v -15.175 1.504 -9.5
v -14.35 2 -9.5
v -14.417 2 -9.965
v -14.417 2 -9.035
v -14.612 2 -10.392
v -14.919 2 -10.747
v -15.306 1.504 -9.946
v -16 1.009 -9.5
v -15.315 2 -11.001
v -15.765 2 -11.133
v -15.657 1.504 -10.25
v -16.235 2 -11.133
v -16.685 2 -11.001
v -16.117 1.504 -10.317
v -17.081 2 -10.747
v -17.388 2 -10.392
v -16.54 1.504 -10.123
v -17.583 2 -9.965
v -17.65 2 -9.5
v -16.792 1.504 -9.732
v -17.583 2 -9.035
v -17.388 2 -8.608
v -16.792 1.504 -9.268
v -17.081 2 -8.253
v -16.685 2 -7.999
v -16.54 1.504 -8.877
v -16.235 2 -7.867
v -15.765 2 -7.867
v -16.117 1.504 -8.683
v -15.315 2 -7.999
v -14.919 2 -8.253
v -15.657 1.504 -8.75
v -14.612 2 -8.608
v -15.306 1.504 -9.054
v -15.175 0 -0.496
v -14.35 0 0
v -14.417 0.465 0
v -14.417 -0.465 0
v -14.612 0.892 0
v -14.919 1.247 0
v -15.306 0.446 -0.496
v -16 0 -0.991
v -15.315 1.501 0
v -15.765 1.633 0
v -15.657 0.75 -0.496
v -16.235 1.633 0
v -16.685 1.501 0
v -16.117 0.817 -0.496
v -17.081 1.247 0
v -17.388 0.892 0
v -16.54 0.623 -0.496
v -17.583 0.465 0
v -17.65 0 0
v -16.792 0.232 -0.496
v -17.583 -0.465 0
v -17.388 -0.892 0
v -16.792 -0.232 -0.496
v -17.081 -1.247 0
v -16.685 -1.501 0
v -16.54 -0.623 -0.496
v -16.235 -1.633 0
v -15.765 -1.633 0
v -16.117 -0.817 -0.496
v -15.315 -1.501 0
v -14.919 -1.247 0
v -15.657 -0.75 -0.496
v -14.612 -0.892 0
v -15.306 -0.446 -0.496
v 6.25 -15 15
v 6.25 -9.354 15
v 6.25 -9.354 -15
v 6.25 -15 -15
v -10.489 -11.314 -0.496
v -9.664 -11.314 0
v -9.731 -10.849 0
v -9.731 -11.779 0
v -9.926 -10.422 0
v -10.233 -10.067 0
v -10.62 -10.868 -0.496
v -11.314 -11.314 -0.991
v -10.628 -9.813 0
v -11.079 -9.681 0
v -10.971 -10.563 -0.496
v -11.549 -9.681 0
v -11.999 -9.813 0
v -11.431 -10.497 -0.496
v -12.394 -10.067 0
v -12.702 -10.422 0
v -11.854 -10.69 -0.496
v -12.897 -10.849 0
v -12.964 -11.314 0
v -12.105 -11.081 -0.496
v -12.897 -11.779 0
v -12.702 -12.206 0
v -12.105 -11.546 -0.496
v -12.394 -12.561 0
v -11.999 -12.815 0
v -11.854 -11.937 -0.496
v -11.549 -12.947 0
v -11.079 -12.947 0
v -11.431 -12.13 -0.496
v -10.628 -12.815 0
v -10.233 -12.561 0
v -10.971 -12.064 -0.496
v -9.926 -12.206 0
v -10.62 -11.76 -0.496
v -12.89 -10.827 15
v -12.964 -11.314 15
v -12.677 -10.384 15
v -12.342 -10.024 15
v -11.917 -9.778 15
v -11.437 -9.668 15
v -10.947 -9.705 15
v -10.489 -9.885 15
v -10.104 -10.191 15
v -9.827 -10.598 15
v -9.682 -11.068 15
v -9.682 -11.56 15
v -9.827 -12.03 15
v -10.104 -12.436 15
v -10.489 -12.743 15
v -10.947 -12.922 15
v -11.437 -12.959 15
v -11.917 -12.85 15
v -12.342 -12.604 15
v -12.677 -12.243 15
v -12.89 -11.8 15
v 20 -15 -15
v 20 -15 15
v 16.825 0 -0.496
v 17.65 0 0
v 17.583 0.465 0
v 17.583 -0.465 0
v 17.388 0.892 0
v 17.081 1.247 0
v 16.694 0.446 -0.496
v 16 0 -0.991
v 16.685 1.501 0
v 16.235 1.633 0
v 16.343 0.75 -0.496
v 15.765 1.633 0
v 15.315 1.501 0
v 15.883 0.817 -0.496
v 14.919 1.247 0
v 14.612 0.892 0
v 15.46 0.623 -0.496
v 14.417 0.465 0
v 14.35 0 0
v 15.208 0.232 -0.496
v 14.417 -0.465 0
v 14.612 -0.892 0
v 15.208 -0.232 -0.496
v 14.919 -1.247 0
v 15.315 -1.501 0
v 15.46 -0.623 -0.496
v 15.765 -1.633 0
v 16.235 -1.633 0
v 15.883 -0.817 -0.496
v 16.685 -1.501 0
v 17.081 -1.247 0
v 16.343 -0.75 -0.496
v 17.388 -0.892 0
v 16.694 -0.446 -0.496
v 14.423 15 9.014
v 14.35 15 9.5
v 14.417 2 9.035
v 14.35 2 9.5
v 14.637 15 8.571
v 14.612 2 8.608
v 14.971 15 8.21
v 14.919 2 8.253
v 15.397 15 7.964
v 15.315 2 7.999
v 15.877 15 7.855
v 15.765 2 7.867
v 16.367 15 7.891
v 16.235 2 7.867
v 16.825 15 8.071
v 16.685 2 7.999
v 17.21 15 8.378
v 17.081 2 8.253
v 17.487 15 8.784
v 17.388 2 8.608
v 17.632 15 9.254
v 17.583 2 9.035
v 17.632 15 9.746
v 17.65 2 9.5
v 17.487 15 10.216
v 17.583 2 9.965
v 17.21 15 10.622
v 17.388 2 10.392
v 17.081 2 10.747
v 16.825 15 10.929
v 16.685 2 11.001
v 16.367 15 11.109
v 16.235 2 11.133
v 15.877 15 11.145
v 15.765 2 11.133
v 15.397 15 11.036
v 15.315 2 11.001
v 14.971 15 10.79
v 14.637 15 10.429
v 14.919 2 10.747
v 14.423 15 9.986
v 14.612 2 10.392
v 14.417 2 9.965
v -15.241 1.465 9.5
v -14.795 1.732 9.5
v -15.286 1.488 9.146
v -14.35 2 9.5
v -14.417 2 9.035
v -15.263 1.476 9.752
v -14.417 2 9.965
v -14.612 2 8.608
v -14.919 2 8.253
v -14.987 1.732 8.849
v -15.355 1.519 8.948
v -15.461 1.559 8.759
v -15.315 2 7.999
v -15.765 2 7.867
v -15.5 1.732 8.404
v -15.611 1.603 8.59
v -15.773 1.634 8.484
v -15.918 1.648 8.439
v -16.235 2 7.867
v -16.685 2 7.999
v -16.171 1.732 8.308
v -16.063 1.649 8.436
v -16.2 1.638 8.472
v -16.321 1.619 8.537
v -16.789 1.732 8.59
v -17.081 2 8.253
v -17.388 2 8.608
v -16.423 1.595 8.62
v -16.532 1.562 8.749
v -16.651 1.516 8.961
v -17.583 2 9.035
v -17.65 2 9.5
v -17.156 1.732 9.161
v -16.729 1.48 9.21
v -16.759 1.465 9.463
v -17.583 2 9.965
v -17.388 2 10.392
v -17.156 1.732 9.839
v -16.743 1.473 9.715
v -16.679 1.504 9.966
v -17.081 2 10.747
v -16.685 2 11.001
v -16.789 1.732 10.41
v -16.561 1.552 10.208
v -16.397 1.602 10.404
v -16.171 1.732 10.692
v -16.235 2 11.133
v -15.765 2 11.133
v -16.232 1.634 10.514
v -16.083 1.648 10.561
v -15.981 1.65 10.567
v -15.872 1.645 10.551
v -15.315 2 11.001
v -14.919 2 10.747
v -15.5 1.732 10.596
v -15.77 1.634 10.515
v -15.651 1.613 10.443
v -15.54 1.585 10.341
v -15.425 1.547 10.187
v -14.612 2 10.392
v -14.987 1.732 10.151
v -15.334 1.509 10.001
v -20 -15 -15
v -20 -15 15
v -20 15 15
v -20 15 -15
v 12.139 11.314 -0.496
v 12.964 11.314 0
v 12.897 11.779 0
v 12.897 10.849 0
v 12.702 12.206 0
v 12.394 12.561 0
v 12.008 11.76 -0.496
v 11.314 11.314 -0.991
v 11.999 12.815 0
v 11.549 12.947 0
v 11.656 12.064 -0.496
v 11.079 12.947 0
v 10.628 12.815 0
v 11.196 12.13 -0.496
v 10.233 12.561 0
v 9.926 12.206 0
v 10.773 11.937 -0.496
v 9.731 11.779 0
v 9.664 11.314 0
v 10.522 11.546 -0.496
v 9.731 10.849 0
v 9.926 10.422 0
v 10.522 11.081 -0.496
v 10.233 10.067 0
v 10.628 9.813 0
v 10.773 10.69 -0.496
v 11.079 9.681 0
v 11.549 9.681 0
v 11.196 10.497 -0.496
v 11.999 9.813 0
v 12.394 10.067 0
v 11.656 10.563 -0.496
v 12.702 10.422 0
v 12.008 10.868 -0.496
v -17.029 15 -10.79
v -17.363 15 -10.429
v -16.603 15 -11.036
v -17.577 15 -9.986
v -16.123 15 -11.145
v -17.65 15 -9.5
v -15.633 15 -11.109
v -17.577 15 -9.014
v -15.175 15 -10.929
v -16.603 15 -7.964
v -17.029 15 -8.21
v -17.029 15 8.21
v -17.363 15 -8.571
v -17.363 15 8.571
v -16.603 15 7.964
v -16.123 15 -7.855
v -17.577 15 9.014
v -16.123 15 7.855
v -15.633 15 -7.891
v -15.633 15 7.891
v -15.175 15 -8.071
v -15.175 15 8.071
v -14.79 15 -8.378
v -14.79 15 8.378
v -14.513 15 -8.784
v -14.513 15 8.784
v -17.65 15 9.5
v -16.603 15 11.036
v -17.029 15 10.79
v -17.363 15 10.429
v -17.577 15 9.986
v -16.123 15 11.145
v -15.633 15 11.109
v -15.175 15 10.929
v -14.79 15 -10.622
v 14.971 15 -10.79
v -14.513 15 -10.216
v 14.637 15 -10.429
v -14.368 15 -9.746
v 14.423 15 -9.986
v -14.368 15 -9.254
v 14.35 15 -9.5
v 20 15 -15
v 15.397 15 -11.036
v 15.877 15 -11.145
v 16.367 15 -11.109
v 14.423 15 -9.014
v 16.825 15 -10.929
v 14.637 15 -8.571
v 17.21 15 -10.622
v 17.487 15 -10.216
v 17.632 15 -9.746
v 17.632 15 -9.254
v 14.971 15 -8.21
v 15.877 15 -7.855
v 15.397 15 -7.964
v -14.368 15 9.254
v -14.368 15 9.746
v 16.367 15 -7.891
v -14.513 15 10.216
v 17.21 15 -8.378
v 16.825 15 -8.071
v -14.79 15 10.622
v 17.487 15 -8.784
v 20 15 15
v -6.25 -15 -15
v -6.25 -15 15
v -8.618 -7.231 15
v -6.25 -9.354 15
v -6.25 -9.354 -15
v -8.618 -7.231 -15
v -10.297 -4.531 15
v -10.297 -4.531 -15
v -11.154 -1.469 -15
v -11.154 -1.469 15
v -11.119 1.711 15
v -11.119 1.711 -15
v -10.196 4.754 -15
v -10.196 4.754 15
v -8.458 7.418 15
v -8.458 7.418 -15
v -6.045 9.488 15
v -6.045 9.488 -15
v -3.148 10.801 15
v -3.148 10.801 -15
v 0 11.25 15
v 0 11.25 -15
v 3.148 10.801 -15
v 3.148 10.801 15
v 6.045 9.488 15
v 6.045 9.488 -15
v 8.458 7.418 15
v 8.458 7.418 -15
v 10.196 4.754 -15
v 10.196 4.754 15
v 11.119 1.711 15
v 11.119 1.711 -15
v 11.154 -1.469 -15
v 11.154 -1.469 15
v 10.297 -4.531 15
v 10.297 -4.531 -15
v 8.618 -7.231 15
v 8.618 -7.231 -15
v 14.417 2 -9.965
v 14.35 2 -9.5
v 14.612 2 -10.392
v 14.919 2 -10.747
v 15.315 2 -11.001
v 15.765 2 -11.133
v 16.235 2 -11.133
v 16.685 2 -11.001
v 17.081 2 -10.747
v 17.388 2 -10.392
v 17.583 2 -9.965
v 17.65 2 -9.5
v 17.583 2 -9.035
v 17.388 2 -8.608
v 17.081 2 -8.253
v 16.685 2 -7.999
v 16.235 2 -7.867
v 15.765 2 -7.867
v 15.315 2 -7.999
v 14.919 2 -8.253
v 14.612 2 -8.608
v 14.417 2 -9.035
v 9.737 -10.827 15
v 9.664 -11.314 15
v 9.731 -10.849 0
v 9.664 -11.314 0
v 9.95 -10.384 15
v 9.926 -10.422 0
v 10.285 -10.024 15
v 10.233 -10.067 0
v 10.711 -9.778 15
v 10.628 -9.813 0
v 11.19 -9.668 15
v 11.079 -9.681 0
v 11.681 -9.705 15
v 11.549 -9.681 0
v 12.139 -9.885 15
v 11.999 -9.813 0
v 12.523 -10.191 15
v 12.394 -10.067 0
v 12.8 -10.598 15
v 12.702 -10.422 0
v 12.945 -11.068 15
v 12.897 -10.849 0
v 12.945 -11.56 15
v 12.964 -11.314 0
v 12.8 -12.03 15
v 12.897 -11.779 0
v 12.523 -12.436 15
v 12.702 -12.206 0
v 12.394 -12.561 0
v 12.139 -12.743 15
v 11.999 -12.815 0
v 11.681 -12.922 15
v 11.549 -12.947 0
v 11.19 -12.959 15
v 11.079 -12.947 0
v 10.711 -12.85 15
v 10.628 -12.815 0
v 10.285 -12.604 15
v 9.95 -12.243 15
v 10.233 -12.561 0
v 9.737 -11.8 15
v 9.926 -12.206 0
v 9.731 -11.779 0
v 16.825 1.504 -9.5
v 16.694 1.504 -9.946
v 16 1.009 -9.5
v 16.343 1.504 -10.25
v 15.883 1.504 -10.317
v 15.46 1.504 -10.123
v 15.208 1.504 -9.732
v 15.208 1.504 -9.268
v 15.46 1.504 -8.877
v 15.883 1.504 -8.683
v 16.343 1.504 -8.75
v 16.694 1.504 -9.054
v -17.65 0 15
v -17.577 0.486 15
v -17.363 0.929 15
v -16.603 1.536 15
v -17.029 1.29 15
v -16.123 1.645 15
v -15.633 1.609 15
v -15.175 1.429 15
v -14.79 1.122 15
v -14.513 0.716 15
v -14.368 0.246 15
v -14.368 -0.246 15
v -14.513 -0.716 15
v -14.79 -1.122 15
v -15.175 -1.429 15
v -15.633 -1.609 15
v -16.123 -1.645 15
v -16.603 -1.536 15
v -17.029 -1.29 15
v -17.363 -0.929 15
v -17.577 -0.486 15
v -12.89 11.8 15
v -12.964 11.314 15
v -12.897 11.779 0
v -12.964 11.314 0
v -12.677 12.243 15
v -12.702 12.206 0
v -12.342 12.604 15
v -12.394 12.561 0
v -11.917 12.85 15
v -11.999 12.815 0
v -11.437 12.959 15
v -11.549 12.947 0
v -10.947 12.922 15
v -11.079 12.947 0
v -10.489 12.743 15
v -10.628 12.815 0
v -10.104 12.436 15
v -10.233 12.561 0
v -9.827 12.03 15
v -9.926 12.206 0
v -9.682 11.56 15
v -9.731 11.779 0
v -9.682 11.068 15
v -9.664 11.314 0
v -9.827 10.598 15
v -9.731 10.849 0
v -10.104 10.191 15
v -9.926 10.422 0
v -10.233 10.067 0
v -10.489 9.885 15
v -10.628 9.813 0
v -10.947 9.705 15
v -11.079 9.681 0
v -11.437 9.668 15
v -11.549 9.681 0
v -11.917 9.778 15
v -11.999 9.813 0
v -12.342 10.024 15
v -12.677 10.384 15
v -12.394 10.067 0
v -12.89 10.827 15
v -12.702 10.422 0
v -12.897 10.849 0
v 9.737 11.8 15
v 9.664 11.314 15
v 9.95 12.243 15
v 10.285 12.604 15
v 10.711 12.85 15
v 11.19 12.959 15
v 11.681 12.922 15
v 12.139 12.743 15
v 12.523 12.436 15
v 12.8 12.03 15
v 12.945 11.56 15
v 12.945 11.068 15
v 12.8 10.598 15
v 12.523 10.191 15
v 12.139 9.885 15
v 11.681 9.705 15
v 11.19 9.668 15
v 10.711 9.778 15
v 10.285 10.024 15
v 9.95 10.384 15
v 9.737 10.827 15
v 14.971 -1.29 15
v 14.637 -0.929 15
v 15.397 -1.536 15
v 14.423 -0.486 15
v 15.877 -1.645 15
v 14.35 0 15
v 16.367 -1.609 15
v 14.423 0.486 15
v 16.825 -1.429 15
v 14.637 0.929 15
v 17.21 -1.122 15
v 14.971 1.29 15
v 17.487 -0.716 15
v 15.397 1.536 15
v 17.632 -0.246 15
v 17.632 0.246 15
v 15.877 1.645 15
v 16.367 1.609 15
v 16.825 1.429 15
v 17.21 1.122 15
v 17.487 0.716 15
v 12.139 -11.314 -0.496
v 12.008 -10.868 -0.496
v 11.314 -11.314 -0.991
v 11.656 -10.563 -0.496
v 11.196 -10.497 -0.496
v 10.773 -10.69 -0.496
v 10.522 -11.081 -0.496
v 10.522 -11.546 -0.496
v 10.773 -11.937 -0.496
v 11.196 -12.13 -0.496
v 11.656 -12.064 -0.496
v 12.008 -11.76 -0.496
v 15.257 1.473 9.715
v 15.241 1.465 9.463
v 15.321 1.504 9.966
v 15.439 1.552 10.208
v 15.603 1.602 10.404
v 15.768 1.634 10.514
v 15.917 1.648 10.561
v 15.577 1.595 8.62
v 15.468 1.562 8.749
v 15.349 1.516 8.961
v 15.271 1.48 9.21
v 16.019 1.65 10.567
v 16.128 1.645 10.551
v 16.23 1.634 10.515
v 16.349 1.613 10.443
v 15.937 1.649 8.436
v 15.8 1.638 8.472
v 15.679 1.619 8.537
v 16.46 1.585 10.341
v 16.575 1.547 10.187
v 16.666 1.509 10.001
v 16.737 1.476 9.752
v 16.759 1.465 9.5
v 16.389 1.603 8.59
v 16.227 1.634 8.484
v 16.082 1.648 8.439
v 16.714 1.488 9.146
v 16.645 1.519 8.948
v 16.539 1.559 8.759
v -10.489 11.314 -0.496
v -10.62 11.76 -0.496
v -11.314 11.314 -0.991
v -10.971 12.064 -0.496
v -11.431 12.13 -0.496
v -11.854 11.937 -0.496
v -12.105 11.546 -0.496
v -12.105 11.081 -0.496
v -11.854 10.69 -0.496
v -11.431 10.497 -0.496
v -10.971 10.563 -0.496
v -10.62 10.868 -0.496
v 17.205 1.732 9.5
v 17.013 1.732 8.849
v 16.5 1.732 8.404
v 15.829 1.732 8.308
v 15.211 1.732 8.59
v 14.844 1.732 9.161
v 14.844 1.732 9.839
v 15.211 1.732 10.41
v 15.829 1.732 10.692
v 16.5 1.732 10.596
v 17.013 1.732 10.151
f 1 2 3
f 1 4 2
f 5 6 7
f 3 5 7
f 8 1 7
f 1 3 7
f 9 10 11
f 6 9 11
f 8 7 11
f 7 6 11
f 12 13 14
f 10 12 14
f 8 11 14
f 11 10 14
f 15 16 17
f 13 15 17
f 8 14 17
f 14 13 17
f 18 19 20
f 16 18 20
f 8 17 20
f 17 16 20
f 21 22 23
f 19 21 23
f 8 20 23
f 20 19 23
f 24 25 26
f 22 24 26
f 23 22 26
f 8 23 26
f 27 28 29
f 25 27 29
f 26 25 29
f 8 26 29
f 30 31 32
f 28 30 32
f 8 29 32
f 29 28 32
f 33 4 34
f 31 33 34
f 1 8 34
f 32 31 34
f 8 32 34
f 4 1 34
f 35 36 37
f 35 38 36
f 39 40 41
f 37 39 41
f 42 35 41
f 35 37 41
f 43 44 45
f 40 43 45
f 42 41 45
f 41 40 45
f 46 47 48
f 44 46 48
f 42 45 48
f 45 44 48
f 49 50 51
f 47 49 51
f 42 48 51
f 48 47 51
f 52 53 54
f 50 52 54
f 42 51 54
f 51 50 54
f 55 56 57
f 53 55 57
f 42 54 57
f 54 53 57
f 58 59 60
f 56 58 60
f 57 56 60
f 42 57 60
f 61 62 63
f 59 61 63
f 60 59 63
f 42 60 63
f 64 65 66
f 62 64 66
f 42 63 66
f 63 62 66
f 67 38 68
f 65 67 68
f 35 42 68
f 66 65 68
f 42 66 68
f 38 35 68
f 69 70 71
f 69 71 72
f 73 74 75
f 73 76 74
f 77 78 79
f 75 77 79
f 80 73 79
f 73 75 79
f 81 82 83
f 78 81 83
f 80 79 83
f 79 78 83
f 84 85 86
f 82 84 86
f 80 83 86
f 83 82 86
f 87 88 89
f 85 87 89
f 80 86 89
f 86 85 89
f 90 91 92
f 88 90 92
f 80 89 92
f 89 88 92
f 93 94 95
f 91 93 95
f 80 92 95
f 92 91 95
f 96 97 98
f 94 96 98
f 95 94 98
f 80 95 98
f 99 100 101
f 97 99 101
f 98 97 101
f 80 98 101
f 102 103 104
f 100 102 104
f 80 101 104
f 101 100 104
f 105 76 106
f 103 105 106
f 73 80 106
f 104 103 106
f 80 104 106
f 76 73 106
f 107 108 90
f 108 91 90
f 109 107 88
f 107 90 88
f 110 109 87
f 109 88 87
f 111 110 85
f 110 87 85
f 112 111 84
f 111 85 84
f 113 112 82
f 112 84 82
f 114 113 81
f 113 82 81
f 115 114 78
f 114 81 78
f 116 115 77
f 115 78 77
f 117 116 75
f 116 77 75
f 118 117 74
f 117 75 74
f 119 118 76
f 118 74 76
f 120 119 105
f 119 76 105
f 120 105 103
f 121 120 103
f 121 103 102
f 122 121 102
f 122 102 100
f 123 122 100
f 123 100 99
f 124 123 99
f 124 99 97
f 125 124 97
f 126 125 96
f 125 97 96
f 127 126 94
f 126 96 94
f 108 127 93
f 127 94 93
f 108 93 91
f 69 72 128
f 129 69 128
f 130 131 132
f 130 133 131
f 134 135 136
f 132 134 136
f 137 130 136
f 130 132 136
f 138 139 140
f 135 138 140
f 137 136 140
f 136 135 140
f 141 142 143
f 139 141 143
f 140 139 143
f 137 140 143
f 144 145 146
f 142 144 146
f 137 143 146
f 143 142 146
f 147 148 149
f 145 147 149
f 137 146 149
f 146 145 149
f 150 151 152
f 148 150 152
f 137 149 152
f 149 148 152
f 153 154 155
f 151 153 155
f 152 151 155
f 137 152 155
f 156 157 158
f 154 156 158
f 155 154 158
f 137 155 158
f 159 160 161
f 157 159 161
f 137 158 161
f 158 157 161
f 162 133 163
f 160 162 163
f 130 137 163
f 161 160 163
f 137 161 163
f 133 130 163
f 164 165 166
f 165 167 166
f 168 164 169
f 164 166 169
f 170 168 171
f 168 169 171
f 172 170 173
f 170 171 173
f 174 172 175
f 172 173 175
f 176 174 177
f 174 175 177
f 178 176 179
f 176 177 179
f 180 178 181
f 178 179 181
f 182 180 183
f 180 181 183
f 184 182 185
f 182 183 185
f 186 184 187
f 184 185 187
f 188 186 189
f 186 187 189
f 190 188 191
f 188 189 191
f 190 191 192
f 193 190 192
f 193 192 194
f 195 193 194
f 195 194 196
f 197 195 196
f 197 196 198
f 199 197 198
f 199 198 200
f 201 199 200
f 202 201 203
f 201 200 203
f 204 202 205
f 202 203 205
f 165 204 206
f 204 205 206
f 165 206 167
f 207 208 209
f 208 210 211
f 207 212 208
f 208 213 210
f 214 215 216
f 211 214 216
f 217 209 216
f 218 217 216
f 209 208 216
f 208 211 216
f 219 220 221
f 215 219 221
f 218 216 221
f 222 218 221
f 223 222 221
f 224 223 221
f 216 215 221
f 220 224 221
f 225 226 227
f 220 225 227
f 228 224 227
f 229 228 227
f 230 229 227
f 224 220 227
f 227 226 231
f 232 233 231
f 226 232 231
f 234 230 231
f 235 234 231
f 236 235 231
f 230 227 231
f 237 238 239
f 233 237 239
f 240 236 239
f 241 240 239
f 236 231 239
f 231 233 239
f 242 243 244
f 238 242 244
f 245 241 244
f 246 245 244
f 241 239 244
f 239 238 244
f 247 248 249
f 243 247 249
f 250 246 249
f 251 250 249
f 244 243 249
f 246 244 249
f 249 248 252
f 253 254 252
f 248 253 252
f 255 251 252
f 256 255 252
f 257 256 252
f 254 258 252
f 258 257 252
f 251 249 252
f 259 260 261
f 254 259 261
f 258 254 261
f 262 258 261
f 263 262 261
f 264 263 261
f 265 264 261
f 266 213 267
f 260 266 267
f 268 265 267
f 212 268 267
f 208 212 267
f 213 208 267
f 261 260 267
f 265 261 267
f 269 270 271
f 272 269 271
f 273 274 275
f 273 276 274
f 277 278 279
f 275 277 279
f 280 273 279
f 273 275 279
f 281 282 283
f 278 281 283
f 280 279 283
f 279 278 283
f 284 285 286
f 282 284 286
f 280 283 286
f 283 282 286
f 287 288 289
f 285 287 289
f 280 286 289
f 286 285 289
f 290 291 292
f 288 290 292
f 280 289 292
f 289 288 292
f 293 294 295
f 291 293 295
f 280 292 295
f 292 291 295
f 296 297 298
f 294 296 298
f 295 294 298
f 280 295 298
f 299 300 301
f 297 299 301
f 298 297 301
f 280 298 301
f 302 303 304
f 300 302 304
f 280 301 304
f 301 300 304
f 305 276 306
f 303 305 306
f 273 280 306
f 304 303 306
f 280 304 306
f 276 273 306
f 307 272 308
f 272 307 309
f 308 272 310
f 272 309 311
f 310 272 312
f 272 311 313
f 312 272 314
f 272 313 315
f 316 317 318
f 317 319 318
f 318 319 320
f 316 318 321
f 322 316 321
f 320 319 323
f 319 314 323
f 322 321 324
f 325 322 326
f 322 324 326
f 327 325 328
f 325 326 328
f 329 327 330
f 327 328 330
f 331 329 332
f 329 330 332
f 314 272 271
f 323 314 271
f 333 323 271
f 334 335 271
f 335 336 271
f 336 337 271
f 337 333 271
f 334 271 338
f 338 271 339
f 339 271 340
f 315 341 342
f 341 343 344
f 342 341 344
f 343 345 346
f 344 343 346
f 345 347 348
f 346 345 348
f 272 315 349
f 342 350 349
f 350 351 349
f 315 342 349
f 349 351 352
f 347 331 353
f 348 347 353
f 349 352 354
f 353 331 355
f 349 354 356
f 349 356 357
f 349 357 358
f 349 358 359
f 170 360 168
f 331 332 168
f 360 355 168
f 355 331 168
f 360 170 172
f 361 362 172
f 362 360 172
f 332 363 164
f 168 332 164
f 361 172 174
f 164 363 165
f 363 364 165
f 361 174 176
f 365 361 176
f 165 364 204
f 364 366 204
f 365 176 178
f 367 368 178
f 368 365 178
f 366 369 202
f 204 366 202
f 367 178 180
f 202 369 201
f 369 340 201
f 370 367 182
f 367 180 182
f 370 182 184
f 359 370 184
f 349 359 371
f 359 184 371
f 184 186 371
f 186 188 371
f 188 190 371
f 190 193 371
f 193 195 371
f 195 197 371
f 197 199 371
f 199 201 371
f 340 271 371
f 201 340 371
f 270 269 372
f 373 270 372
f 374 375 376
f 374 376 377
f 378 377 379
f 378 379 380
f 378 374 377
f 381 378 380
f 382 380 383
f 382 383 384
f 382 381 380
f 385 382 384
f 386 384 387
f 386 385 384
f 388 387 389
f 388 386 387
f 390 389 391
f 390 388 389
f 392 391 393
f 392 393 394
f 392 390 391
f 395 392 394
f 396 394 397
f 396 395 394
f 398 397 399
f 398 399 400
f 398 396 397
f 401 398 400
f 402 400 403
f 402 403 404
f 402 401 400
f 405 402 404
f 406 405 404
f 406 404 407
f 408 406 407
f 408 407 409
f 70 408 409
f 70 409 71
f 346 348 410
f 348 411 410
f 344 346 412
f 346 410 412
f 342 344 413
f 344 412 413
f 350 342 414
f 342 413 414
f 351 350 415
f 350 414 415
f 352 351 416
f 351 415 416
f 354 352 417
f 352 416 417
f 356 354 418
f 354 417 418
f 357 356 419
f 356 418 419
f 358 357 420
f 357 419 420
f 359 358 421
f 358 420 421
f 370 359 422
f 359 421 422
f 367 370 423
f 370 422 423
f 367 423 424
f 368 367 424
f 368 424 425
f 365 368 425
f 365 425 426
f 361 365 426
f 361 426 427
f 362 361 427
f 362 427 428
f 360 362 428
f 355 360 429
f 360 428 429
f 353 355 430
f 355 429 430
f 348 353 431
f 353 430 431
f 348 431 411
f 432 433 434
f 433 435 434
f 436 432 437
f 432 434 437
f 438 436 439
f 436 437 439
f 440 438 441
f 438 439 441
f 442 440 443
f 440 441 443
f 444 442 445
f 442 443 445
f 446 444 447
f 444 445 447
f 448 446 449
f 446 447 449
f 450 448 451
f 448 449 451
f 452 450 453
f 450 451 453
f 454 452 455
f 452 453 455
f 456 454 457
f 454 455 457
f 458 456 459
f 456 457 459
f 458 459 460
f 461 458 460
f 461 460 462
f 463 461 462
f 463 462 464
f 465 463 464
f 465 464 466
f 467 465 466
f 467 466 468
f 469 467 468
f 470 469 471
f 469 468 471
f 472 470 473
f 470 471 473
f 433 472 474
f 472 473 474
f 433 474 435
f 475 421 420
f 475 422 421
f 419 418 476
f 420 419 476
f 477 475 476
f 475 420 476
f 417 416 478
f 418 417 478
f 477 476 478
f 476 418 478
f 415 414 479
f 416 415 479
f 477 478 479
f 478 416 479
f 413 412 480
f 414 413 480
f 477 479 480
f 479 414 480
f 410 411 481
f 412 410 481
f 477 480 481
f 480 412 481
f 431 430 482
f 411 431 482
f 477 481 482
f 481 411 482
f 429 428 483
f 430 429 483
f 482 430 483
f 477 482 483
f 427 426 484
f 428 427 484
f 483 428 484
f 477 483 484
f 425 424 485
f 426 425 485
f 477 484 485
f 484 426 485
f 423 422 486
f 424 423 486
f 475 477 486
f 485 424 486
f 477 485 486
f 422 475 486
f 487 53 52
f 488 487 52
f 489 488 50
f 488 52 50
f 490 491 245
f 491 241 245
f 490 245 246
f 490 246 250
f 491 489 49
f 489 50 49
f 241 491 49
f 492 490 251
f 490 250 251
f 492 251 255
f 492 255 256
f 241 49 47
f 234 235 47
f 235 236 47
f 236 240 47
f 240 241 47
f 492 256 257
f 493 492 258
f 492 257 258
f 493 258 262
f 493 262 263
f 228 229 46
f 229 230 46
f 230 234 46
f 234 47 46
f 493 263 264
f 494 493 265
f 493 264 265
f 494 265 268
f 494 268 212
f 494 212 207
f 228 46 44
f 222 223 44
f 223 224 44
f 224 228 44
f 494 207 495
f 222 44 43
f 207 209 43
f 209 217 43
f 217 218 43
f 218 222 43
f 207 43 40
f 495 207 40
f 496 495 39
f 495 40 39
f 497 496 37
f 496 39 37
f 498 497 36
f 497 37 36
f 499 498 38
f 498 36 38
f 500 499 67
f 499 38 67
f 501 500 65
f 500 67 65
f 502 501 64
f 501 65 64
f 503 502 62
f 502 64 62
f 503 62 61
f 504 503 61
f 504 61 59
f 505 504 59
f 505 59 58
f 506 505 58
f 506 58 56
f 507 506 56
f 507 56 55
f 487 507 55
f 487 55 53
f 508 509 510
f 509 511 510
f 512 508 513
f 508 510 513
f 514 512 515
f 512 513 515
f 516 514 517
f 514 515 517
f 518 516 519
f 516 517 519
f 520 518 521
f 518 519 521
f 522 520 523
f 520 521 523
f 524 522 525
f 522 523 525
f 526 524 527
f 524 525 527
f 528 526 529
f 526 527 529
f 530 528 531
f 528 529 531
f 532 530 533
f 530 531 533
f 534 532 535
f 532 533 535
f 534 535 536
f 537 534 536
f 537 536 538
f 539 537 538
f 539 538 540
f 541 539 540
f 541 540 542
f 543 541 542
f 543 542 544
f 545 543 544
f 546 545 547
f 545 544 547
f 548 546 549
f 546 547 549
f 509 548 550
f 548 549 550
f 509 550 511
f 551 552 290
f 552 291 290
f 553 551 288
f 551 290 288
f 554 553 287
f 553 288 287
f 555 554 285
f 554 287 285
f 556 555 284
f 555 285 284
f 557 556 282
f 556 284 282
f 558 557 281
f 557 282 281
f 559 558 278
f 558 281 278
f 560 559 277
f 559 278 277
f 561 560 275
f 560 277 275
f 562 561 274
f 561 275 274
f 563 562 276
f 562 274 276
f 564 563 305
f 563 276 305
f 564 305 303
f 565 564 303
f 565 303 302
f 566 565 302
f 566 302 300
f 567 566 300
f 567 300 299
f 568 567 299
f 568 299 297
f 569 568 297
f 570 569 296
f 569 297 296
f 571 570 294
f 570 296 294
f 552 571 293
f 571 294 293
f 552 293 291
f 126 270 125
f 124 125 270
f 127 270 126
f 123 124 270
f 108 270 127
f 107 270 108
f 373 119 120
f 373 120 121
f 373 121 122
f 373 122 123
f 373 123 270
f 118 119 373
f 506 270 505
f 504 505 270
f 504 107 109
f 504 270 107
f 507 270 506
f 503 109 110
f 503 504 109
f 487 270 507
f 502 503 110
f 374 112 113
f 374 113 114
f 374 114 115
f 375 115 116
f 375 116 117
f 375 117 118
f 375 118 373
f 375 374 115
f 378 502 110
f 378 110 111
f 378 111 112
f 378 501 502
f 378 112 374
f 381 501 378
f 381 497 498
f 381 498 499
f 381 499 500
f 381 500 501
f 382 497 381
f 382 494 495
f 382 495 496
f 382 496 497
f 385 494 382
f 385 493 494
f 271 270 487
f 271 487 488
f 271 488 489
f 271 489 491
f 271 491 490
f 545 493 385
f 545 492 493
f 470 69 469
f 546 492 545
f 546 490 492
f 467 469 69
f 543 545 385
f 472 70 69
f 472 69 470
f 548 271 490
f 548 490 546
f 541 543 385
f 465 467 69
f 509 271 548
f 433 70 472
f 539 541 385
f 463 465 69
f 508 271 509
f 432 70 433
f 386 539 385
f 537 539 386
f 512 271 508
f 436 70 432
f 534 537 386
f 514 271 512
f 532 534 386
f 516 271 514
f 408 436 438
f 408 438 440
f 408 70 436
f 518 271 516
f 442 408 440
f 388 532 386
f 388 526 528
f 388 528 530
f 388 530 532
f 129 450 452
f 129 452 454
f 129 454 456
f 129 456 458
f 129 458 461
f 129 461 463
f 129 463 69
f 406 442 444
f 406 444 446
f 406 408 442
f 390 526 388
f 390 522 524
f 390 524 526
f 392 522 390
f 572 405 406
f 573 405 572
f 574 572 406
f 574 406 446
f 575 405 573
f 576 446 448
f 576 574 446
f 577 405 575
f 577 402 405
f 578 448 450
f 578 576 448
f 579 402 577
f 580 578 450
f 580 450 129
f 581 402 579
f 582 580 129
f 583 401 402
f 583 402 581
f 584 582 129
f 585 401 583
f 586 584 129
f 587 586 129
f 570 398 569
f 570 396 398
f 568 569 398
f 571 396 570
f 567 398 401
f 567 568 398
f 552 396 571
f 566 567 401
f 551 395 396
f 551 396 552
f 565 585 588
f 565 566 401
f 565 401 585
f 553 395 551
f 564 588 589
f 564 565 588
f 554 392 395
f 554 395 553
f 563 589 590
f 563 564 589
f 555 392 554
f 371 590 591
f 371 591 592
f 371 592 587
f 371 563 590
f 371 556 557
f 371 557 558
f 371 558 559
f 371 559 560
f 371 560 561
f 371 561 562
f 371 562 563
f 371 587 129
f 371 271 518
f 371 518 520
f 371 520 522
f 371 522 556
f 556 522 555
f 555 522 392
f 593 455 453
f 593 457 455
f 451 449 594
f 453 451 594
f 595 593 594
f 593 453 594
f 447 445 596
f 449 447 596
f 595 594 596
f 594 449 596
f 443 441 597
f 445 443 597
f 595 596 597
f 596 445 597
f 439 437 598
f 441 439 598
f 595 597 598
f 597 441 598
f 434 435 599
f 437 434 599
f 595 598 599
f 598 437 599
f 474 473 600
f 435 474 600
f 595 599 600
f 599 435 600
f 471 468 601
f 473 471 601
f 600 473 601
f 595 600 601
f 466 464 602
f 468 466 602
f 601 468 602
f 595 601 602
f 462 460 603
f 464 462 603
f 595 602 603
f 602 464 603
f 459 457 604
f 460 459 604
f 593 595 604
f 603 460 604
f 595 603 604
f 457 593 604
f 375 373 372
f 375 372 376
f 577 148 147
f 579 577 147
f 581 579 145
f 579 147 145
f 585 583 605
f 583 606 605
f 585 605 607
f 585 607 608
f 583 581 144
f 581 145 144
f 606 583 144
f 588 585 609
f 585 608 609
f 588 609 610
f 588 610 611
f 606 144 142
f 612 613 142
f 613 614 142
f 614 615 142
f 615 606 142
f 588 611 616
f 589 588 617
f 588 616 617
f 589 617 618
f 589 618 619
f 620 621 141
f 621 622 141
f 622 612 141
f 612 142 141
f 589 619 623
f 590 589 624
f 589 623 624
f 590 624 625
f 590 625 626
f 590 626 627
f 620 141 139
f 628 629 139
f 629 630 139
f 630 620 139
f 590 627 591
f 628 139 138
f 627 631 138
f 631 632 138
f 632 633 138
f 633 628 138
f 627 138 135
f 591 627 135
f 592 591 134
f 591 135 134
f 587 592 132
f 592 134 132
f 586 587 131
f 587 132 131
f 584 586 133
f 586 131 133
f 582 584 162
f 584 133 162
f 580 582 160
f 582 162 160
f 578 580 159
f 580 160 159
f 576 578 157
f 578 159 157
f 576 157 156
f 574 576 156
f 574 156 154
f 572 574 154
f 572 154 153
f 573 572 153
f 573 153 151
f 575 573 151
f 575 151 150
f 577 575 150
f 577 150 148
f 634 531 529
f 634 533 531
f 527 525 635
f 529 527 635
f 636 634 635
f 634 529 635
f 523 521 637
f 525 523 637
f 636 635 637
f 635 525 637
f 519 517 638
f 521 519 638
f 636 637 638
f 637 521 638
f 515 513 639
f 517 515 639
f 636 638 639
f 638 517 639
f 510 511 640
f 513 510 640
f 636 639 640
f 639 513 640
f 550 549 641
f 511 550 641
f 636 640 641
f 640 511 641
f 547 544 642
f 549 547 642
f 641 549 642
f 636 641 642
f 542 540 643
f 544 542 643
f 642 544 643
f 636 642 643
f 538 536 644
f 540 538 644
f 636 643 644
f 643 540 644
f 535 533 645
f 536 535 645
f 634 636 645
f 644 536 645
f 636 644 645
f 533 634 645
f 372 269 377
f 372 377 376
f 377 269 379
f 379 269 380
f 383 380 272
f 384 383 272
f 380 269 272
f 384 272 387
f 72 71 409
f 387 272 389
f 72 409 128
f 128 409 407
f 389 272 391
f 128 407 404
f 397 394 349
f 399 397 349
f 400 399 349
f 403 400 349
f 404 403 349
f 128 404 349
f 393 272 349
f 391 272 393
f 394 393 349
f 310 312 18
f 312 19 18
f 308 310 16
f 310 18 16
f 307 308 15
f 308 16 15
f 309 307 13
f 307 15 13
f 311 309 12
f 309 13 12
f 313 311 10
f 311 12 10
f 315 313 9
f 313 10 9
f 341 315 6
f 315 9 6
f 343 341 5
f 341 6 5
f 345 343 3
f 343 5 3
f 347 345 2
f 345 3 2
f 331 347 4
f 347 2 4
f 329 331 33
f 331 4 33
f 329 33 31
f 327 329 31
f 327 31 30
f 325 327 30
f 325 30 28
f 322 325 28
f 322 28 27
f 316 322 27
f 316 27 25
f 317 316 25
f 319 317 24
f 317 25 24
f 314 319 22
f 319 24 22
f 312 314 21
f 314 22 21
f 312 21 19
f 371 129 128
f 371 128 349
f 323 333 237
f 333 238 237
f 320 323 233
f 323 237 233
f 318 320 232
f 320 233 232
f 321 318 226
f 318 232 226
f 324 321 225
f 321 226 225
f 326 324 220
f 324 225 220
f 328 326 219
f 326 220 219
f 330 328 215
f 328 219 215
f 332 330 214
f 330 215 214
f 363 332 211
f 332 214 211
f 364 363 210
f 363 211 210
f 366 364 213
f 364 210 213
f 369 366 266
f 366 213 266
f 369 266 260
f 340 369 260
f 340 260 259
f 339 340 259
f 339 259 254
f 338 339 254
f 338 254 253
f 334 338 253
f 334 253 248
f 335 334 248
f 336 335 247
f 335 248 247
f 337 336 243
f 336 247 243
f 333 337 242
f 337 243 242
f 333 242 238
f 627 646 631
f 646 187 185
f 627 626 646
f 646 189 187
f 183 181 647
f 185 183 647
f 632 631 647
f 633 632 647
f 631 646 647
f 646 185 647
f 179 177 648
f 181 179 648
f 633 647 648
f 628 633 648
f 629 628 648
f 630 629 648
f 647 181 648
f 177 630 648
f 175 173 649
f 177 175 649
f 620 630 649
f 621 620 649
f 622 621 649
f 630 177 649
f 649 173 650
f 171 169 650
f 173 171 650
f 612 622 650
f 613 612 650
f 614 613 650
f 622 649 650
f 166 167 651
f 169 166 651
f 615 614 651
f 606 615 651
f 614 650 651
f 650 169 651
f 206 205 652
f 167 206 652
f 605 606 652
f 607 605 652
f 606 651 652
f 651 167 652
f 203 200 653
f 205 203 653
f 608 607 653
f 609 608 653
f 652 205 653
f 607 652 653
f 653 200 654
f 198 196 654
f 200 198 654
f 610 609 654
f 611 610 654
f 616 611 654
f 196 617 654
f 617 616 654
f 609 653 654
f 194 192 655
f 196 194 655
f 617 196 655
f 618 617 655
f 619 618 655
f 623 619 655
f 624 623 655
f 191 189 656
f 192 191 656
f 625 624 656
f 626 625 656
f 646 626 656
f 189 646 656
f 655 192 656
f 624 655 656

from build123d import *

# Parameters (mm, degrees)
IZIM1_W                            = 40
IZIM1_H                            = 30
Y_KSEKLIK_EKSTR_ZYON1_DEPTH        = 15
KES_EKSTR_ZYON1_DEPTH              = 30
M4_TAPA_I_IN_Z_VANA_MATKAB_1_D     = 3.3
M4_TAPA_I_IN_Z_VANA_MATKAB_1_DEPTH = 15
M4_TAPA_I_IN_Z_VANA_MATKAB_1_TIP   = 0.991420021
M4_TAPA_I_IN_Z_VANA_MATKAB_3_D     = 3.3
M4_TAPA_I_IN_Z_VANA_MATKAB_3_DEPTH = 13
M4_TAPA_I_IN_Z_VANA_MATKAB_3_TIP   = 0.991420021


with BuildPart() as part:
    # Çizim1 → Yükseklik-Ekstrüzyon1 (new body, symmetric)
    with BuildSketch(Plane.XY):
        Rectangle(IZIM1_W, IZIM1_H)
    extrude(amount=Y_KSEKLIK_EKSTR_ZYON1_DEPTH, both=True)

    # Çizim2 → Kes-Ekstrüzyon1 (cut)
    with BuildSketch(Plane.XY.offset(15)):
        with BuildLine():
            Line((-6.25, -15), (-6.25, -9.354143467))
            ThreePointArc((-6.25, -9.354143467), (0, 11.25), (6.25, -9.354143467))
            Line((6.25, -9.354143467), (6.25, -15))
            Line((6.25, -15), (-6.25, -15))
        make_face()
    extrude(amount=-KES_EKSTR_ZYON1_DEPTH, mode=Mode.SUBTRACT)

    # M4 Tapa için Zıvana matkabı1
    with Locations(Plane(origin=(-11.313708499, 11.313708499, 15), x_dir=(1, 0, 0), z_dir=(0, 0, 1))):
        with Locations((0, 0), (-4.686291501, -11.313708499), (0, -22.627416998), (22.627416998, -22.627416998), (27.313708499, -11.313708499), (22.627416998, 0)):
            Hole(M4_TAPA_I_IN_Z_VANA_MATKAB_1_D / 2, depth=M4_TAPA_I_IN_Z_VANA_MATKAB_1_DEPTH)
            with Locations((0, 0, -(M4_TAPA_I_IN_Z_VANA_MATKAB_1_DEPTH + M4_TAPA_I_IN_Z_VANA_MATKAB_1_TIP / 2))):  # 118° drill point
                Cone(0, M4_TAPA_I_IN_Z_VANA_MATKAB_1_D / 2, M4_TAPA_I_IN_Z_VANA_MATKAB_1_TIP, mode=Mode.SUBTRACT)

    # M4 Tapa için Zıvana matkabı3
    with Locations(Plane(origin=(-16, 15, -9.5), x_dir=(1, 0, 0), z_dir=(0, 1, 0))):
        with Locations((0, 0), (0, -19), (32, 0), (32, -19)):
            Hole(M4_TAPA_I_IN_Z_VANA_MATKAB_3_D / 2, depth=M4_TAPA_I_IN_Z_VANA_MATKAB_3_DEPTH)
            with Locations((0, 0, -(M4_TAPA_I_IN_Z_VANA_MATKAB_3_DEPTH + M4_TAPA_I_IN_Z_VANA_MATKAB_3_TIP / 2))):  # 118° drill point
                Cone(0, M4_TAPA_I_IN_Z_VANA_MATKAB_3_D / 2, M4_TAPA_I_IN_Z_VANA_MATKAB_3_TIP, mode=Mode.SUBTRACT)


solid = part.part
